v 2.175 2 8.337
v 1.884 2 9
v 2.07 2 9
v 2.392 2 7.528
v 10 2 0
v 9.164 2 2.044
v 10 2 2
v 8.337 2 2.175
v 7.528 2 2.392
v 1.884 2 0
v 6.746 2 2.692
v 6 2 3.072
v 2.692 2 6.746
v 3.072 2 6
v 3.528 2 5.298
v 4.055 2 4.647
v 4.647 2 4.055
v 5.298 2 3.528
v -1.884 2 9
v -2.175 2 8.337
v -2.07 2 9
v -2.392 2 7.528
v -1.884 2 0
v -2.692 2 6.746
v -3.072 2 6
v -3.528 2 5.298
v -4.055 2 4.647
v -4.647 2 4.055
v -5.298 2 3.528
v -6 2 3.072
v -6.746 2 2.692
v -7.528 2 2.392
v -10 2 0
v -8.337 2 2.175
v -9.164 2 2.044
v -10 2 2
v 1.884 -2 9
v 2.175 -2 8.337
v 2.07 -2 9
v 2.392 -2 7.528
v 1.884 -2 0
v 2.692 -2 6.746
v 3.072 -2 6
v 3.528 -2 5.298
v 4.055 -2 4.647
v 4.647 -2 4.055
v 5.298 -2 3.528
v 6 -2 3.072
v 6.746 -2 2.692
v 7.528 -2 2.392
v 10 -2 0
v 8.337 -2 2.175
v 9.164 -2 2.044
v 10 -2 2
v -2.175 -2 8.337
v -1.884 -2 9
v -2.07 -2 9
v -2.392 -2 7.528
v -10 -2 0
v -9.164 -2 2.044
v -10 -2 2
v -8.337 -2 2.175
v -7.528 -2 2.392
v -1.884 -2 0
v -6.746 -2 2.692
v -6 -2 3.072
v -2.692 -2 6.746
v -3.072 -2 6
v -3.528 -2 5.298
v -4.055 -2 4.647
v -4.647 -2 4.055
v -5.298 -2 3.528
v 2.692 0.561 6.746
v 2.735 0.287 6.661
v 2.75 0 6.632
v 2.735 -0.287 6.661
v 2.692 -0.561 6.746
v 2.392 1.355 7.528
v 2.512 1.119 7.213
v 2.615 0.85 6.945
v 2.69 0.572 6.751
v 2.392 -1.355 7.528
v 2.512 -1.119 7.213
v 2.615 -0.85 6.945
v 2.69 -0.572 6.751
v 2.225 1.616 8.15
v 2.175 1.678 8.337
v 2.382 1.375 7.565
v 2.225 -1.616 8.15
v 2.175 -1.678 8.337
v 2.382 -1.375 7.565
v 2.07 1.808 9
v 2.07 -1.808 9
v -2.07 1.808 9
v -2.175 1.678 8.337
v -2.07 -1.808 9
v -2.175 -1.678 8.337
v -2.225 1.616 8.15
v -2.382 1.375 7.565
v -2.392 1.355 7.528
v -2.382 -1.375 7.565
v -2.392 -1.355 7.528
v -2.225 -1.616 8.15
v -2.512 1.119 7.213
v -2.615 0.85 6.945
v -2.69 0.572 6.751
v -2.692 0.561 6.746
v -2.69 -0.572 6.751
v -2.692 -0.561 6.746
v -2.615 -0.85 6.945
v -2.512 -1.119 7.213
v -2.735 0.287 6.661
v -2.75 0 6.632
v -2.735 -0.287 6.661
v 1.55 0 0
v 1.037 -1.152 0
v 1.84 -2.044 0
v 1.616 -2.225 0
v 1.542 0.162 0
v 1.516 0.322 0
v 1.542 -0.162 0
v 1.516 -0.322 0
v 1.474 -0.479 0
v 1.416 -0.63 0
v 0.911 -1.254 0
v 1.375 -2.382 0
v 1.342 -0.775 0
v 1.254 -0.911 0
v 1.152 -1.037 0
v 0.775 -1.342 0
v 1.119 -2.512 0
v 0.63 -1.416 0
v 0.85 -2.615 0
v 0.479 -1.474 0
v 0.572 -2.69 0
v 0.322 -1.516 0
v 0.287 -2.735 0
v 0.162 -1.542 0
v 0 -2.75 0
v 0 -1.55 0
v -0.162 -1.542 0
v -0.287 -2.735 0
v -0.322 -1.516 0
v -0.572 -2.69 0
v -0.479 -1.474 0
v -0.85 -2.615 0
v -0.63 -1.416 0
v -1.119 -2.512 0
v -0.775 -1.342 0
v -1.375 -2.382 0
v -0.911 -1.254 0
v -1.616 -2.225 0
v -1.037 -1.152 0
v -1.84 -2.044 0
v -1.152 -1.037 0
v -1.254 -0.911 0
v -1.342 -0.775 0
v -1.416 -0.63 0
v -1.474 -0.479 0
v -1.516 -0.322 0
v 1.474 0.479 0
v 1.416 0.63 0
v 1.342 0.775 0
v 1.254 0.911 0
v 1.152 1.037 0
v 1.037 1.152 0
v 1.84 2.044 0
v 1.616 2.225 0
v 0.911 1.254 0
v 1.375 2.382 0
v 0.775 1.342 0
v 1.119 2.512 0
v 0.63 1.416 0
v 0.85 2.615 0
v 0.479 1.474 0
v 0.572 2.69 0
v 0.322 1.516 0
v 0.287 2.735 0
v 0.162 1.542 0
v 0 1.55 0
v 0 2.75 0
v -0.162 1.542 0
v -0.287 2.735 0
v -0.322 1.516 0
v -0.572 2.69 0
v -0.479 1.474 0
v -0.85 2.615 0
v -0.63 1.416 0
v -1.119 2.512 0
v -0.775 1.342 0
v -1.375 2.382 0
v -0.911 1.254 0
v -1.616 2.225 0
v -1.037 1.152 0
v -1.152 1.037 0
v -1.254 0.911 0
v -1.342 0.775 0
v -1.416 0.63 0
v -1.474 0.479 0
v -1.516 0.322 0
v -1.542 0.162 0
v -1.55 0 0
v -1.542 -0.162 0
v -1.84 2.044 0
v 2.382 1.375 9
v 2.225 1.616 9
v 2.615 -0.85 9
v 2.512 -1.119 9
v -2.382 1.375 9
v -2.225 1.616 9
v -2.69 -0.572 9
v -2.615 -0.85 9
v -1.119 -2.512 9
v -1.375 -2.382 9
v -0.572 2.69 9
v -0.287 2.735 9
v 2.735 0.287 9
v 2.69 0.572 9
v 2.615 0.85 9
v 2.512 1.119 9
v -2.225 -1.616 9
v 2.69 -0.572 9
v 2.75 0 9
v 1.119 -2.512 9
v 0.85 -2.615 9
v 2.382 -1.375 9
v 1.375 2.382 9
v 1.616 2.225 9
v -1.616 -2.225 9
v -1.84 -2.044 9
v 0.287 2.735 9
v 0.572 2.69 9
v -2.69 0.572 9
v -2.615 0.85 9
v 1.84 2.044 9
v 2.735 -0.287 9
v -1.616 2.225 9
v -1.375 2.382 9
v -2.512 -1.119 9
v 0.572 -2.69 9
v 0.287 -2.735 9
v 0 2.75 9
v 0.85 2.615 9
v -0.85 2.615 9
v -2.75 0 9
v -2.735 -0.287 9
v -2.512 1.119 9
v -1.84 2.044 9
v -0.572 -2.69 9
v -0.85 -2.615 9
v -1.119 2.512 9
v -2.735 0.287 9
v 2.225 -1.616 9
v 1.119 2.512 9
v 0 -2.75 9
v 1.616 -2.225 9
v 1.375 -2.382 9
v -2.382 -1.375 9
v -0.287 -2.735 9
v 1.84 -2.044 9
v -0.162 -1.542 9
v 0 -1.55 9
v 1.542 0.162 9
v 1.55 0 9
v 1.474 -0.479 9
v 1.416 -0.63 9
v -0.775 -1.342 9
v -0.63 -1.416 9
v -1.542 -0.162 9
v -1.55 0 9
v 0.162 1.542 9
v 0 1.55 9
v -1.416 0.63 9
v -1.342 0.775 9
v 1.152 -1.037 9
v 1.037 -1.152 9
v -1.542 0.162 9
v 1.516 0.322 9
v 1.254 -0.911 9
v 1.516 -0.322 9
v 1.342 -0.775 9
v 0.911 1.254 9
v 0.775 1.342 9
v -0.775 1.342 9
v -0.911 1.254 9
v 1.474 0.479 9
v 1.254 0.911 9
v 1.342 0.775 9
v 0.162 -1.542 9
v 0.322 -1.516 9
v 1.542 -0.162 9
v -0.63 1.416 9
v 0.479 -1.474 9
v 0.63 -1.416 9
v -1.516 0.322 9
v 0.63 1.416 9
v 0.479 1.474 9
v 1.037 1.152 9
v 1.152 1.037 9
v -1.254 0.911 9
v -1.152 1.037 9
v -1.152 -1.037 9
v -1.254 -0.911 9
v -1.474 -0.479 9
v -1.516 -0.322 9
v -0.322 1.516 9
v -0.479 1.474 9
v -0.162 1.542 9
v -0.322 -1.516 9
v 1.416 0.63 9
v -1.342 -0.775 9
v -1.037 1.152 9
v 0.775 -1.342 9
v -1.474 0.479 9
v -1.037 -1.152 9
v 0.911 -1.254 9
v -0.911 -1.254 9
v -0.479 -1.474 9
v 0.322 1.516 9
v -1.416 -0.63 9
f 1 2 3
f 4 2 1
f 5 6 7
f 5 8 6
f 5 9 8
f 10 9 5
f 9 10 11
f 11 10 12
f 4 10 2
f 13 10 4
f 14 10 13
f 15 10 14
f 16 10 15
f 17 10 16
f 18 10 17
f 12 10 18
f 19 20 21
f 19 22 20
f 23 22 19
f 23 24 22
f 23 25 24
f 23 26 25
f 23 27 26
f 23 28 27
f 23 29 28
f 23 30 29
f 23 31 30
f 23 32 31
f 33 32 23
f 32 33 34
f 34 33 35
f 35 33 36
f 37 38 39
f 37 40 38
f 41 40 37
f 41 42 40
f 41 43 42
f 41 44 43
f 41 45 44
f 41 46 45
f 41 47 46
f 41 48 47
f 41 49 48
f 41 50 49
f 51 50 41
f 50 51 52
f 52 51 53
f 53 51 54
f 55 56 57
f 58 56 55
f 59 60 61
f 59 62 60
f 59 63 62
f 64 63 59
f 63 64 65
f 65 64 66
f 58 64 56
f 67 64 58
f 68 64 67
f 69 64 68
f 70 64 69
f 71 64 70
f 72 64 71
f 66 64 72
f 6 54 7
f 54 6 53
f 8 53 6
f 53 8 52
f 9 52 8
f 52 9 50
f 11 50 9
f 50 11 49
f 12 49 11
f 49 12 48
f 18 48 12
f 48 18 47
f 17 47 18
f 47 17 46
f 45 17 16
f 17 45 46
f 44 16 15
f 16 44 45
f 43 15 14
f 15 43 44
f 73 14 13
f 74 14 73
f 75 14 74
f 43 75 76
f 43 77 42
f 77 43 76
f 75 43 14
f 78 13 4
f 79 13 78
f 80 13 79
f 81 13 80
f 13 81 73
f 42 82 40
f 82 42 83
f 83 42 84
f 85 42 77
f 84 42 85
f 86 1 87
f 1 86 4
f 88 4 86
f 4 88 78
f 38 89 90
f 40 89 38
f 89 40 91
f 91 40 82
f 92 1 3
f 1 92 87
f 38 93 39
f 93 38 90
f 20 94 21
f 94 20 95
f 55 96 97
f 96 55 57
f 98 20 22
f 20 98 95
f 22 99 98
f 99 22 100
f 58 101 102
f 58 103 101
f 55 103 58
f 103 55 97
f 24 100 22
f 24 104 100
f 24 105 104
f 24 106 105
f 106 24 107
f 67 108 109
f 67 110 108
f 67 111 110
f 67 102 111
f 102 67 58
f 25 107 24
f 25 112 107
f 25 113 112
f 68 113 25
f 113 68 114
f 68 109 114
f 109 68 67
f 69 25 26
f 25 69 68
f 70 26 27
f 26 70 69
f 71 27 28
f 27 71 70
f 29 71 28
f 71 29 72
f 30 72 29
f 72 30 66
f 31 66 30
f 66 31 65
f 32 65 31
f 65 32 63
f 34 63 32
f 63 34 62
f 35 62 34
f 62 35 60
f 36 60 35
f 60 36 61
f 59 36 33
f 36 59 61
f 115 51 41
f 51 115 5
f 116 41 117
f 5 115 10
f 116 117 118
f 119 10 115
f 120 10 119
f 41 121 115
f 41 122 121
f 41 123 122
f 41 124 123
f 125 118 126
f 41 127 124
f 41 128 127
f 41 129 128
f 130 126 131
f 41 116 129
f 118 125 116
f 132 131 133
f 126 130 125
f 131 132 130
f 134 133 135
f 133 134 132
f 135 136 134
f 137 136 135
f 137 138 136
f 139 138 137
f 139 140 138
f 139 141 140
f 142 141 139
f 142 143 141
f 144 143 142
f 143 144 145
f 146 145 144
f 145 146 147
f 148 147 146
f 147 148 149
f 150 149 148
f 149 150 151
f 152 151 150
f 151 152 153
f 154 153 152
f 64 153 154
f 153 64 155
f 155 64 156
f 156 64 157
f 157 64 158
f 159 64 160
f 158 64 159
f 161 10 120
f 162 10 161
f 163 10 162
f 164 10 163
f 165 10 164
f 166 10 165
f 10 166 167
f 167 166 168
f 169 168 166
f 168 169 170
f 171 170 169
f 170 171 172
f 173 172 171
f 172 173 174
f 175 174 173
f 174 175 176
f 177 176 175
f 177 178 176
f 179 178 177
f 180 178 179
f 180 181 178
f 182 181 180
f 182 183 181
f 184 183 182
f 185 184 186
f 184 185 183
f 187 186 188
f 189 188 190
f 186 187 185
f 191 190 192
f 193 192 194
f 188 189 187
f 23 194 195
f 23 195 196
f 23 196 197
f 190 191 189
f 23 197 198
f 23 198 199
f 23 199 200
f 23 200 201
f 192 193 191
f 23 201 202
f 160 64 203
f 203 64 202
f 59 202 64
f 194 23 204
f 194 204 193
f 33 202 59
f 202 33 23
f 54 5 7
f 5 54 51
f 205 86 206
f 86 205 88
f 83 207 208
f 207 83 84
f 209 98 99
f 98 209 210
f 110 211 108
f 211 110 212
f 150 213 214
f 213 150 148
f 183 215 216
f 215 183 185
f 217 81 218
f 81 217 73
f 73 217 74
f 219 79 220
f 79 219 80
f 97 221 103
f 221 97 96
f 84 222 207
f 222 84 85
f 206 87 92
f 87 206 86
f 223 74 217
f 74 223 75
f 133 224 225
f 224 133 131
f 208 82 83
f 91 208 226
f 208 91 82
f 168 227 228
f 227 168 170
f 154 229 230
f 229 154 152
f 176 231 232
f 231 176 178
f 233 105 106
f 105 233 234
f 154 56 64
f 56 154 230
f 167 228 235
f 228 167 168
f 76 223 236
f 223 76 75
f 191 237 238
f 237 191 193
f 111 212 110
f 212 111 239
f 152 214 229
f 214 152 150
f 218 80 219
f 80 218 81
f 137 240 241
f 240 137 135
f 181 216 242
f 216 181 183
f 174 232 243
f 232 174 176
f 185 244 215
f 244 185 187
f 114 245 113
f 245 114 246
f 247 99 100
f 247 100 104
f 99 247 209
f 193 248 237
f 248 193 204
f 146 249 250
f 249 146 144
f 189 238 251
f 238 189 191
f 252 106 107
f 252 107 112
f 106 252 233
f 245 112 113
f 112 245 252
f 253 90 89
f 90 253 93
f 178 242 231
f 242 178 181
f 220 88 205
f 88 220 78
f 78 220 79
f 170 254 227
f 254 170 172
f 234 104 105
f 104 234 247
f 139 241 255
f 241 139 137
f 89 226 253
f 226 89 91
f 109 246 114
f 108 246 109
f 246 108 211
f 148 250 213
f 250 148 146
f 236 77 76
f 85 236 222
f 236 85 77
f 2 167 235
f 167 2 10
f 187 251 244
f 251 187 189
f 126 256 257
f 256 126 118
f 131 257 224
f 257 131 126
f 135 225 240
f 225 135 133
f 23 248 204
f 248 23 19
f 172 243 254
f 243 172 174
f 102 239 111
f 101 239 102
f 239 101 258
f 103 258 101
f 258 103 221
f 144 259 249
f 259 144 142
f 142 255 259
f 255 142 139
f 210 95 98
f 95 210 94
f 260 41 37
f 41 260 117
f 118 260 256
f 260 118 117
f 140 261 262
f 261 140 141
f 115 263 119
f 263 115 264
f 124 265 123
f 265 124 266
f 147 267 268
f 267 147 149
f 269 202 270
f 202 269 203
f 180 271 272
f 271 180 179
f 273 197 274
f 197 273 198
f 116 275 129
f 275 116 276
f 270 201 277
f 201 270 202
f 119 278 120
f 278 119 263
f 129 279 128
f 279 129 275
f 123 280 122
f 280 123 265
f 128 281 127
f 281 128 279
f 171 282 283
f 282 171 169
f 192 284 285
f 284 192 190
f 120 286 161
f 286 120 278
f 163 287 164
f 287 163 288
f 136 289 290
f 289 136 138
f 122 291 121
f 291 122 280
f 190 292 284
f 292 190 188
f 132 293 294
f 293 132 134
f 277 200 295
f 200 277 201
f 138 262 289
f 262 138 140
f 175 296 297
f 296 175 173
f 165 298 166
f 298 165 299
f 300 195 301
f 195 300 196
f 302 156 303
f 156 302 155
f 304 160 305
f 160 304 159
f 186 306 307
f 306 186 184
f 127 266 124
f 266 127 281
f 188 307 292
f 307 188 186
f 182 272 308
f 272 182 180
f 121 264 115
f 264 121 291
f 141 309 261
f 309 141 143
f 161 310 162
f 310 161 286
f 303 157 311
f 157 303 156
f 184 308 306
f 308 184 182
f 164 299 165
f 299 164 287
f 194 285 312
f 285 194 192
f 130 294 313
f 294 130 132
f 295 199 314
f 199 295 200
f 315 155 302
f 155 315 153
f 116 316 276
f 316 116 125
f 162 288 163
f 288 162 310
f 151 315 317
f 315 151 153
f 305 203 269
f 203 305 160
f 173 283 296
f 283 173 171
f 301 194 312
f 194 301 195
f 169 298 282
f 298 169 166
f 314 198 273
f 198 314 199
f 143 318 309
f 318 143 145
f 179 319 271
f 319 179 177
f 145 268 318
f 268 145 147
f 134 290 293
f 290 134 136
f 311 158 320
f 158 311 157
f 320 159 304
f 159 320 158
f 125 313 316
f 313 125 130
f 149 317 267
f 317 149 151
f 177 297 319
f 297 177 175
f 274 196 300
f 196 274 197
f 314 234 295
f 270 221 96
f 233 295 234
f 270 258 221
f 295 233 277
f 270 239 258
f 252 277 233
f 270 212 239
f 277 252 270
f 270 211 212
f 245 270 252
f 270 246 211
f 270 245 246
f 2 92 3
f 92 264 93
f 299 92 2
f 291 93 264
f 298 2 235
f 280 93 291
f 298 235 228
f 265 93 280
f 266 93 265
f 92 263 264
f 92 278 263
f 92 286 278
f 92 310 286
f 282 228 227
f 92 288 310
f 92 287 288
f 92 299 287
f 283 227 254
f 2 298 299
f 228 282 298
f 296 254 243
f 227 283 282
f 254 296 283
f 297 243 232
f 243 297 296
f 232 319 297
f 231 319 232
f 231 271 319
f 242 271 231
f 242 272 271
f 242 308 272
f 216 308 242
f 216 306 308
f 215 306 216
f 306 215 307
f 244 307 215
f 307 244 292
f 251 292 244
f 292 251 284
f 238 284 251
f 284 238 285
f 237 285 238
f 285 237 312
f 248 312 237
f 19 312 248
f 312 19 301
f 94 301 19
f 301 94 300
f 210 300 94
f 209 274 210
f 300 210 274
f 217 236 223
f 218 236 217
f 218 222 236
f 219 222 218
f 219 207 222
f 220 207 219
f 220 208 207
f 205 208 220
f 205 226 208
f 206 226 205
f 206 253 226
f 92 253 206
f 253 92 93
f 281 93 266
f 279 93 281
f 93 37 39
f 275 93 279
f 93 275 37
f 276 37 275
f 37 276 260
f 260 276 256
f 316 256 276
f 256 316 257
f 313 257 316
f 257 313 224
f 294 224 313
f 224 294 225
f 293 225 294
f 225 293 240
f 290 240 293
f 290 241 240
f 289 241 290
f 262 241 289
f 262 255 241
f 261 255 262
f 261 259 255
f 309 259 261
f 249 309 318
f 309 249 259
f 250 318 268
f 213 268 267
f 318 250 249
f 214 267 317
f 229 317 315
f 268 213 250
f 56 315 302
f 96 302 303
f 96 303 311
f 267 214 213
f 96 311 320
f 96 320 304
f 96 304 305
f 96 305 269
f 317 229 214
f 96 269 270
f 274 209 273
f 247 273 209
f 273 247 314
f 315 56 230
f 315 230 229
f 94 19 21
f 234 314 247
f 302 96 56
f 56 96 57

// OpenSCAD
screw_bottom();

module screw_bottom()
{
  height = 10;
  width = 20;
  screw = 4;


  difference()
  {    
    union()
    {
      translate([0,2,0])
        rotate([90,0,0])
          linear_extrude(screw)
          {
            difference()
            {
              translate([0,height/2,0])
                square([width, height], center=true);
              translate([width/2,height,0])
                circle(r=(width-screw)/2, $fn=60);
              translate([-(width/2),height,0])
                circle(r=(width-screw)/2, $fn=60);
            }
          }
    translate([0,0,height/2])
      cylinder(d=5.5, height, $fn=60, center=true);
    }
    translate([0,0,height/2])
      cylinder(d=3.1, height+1, $fn=60, center=true);
    
    translate([0,0,2+height-1])
      cylinder(d=6, 4, $fn=60, center=true);
  }
}
